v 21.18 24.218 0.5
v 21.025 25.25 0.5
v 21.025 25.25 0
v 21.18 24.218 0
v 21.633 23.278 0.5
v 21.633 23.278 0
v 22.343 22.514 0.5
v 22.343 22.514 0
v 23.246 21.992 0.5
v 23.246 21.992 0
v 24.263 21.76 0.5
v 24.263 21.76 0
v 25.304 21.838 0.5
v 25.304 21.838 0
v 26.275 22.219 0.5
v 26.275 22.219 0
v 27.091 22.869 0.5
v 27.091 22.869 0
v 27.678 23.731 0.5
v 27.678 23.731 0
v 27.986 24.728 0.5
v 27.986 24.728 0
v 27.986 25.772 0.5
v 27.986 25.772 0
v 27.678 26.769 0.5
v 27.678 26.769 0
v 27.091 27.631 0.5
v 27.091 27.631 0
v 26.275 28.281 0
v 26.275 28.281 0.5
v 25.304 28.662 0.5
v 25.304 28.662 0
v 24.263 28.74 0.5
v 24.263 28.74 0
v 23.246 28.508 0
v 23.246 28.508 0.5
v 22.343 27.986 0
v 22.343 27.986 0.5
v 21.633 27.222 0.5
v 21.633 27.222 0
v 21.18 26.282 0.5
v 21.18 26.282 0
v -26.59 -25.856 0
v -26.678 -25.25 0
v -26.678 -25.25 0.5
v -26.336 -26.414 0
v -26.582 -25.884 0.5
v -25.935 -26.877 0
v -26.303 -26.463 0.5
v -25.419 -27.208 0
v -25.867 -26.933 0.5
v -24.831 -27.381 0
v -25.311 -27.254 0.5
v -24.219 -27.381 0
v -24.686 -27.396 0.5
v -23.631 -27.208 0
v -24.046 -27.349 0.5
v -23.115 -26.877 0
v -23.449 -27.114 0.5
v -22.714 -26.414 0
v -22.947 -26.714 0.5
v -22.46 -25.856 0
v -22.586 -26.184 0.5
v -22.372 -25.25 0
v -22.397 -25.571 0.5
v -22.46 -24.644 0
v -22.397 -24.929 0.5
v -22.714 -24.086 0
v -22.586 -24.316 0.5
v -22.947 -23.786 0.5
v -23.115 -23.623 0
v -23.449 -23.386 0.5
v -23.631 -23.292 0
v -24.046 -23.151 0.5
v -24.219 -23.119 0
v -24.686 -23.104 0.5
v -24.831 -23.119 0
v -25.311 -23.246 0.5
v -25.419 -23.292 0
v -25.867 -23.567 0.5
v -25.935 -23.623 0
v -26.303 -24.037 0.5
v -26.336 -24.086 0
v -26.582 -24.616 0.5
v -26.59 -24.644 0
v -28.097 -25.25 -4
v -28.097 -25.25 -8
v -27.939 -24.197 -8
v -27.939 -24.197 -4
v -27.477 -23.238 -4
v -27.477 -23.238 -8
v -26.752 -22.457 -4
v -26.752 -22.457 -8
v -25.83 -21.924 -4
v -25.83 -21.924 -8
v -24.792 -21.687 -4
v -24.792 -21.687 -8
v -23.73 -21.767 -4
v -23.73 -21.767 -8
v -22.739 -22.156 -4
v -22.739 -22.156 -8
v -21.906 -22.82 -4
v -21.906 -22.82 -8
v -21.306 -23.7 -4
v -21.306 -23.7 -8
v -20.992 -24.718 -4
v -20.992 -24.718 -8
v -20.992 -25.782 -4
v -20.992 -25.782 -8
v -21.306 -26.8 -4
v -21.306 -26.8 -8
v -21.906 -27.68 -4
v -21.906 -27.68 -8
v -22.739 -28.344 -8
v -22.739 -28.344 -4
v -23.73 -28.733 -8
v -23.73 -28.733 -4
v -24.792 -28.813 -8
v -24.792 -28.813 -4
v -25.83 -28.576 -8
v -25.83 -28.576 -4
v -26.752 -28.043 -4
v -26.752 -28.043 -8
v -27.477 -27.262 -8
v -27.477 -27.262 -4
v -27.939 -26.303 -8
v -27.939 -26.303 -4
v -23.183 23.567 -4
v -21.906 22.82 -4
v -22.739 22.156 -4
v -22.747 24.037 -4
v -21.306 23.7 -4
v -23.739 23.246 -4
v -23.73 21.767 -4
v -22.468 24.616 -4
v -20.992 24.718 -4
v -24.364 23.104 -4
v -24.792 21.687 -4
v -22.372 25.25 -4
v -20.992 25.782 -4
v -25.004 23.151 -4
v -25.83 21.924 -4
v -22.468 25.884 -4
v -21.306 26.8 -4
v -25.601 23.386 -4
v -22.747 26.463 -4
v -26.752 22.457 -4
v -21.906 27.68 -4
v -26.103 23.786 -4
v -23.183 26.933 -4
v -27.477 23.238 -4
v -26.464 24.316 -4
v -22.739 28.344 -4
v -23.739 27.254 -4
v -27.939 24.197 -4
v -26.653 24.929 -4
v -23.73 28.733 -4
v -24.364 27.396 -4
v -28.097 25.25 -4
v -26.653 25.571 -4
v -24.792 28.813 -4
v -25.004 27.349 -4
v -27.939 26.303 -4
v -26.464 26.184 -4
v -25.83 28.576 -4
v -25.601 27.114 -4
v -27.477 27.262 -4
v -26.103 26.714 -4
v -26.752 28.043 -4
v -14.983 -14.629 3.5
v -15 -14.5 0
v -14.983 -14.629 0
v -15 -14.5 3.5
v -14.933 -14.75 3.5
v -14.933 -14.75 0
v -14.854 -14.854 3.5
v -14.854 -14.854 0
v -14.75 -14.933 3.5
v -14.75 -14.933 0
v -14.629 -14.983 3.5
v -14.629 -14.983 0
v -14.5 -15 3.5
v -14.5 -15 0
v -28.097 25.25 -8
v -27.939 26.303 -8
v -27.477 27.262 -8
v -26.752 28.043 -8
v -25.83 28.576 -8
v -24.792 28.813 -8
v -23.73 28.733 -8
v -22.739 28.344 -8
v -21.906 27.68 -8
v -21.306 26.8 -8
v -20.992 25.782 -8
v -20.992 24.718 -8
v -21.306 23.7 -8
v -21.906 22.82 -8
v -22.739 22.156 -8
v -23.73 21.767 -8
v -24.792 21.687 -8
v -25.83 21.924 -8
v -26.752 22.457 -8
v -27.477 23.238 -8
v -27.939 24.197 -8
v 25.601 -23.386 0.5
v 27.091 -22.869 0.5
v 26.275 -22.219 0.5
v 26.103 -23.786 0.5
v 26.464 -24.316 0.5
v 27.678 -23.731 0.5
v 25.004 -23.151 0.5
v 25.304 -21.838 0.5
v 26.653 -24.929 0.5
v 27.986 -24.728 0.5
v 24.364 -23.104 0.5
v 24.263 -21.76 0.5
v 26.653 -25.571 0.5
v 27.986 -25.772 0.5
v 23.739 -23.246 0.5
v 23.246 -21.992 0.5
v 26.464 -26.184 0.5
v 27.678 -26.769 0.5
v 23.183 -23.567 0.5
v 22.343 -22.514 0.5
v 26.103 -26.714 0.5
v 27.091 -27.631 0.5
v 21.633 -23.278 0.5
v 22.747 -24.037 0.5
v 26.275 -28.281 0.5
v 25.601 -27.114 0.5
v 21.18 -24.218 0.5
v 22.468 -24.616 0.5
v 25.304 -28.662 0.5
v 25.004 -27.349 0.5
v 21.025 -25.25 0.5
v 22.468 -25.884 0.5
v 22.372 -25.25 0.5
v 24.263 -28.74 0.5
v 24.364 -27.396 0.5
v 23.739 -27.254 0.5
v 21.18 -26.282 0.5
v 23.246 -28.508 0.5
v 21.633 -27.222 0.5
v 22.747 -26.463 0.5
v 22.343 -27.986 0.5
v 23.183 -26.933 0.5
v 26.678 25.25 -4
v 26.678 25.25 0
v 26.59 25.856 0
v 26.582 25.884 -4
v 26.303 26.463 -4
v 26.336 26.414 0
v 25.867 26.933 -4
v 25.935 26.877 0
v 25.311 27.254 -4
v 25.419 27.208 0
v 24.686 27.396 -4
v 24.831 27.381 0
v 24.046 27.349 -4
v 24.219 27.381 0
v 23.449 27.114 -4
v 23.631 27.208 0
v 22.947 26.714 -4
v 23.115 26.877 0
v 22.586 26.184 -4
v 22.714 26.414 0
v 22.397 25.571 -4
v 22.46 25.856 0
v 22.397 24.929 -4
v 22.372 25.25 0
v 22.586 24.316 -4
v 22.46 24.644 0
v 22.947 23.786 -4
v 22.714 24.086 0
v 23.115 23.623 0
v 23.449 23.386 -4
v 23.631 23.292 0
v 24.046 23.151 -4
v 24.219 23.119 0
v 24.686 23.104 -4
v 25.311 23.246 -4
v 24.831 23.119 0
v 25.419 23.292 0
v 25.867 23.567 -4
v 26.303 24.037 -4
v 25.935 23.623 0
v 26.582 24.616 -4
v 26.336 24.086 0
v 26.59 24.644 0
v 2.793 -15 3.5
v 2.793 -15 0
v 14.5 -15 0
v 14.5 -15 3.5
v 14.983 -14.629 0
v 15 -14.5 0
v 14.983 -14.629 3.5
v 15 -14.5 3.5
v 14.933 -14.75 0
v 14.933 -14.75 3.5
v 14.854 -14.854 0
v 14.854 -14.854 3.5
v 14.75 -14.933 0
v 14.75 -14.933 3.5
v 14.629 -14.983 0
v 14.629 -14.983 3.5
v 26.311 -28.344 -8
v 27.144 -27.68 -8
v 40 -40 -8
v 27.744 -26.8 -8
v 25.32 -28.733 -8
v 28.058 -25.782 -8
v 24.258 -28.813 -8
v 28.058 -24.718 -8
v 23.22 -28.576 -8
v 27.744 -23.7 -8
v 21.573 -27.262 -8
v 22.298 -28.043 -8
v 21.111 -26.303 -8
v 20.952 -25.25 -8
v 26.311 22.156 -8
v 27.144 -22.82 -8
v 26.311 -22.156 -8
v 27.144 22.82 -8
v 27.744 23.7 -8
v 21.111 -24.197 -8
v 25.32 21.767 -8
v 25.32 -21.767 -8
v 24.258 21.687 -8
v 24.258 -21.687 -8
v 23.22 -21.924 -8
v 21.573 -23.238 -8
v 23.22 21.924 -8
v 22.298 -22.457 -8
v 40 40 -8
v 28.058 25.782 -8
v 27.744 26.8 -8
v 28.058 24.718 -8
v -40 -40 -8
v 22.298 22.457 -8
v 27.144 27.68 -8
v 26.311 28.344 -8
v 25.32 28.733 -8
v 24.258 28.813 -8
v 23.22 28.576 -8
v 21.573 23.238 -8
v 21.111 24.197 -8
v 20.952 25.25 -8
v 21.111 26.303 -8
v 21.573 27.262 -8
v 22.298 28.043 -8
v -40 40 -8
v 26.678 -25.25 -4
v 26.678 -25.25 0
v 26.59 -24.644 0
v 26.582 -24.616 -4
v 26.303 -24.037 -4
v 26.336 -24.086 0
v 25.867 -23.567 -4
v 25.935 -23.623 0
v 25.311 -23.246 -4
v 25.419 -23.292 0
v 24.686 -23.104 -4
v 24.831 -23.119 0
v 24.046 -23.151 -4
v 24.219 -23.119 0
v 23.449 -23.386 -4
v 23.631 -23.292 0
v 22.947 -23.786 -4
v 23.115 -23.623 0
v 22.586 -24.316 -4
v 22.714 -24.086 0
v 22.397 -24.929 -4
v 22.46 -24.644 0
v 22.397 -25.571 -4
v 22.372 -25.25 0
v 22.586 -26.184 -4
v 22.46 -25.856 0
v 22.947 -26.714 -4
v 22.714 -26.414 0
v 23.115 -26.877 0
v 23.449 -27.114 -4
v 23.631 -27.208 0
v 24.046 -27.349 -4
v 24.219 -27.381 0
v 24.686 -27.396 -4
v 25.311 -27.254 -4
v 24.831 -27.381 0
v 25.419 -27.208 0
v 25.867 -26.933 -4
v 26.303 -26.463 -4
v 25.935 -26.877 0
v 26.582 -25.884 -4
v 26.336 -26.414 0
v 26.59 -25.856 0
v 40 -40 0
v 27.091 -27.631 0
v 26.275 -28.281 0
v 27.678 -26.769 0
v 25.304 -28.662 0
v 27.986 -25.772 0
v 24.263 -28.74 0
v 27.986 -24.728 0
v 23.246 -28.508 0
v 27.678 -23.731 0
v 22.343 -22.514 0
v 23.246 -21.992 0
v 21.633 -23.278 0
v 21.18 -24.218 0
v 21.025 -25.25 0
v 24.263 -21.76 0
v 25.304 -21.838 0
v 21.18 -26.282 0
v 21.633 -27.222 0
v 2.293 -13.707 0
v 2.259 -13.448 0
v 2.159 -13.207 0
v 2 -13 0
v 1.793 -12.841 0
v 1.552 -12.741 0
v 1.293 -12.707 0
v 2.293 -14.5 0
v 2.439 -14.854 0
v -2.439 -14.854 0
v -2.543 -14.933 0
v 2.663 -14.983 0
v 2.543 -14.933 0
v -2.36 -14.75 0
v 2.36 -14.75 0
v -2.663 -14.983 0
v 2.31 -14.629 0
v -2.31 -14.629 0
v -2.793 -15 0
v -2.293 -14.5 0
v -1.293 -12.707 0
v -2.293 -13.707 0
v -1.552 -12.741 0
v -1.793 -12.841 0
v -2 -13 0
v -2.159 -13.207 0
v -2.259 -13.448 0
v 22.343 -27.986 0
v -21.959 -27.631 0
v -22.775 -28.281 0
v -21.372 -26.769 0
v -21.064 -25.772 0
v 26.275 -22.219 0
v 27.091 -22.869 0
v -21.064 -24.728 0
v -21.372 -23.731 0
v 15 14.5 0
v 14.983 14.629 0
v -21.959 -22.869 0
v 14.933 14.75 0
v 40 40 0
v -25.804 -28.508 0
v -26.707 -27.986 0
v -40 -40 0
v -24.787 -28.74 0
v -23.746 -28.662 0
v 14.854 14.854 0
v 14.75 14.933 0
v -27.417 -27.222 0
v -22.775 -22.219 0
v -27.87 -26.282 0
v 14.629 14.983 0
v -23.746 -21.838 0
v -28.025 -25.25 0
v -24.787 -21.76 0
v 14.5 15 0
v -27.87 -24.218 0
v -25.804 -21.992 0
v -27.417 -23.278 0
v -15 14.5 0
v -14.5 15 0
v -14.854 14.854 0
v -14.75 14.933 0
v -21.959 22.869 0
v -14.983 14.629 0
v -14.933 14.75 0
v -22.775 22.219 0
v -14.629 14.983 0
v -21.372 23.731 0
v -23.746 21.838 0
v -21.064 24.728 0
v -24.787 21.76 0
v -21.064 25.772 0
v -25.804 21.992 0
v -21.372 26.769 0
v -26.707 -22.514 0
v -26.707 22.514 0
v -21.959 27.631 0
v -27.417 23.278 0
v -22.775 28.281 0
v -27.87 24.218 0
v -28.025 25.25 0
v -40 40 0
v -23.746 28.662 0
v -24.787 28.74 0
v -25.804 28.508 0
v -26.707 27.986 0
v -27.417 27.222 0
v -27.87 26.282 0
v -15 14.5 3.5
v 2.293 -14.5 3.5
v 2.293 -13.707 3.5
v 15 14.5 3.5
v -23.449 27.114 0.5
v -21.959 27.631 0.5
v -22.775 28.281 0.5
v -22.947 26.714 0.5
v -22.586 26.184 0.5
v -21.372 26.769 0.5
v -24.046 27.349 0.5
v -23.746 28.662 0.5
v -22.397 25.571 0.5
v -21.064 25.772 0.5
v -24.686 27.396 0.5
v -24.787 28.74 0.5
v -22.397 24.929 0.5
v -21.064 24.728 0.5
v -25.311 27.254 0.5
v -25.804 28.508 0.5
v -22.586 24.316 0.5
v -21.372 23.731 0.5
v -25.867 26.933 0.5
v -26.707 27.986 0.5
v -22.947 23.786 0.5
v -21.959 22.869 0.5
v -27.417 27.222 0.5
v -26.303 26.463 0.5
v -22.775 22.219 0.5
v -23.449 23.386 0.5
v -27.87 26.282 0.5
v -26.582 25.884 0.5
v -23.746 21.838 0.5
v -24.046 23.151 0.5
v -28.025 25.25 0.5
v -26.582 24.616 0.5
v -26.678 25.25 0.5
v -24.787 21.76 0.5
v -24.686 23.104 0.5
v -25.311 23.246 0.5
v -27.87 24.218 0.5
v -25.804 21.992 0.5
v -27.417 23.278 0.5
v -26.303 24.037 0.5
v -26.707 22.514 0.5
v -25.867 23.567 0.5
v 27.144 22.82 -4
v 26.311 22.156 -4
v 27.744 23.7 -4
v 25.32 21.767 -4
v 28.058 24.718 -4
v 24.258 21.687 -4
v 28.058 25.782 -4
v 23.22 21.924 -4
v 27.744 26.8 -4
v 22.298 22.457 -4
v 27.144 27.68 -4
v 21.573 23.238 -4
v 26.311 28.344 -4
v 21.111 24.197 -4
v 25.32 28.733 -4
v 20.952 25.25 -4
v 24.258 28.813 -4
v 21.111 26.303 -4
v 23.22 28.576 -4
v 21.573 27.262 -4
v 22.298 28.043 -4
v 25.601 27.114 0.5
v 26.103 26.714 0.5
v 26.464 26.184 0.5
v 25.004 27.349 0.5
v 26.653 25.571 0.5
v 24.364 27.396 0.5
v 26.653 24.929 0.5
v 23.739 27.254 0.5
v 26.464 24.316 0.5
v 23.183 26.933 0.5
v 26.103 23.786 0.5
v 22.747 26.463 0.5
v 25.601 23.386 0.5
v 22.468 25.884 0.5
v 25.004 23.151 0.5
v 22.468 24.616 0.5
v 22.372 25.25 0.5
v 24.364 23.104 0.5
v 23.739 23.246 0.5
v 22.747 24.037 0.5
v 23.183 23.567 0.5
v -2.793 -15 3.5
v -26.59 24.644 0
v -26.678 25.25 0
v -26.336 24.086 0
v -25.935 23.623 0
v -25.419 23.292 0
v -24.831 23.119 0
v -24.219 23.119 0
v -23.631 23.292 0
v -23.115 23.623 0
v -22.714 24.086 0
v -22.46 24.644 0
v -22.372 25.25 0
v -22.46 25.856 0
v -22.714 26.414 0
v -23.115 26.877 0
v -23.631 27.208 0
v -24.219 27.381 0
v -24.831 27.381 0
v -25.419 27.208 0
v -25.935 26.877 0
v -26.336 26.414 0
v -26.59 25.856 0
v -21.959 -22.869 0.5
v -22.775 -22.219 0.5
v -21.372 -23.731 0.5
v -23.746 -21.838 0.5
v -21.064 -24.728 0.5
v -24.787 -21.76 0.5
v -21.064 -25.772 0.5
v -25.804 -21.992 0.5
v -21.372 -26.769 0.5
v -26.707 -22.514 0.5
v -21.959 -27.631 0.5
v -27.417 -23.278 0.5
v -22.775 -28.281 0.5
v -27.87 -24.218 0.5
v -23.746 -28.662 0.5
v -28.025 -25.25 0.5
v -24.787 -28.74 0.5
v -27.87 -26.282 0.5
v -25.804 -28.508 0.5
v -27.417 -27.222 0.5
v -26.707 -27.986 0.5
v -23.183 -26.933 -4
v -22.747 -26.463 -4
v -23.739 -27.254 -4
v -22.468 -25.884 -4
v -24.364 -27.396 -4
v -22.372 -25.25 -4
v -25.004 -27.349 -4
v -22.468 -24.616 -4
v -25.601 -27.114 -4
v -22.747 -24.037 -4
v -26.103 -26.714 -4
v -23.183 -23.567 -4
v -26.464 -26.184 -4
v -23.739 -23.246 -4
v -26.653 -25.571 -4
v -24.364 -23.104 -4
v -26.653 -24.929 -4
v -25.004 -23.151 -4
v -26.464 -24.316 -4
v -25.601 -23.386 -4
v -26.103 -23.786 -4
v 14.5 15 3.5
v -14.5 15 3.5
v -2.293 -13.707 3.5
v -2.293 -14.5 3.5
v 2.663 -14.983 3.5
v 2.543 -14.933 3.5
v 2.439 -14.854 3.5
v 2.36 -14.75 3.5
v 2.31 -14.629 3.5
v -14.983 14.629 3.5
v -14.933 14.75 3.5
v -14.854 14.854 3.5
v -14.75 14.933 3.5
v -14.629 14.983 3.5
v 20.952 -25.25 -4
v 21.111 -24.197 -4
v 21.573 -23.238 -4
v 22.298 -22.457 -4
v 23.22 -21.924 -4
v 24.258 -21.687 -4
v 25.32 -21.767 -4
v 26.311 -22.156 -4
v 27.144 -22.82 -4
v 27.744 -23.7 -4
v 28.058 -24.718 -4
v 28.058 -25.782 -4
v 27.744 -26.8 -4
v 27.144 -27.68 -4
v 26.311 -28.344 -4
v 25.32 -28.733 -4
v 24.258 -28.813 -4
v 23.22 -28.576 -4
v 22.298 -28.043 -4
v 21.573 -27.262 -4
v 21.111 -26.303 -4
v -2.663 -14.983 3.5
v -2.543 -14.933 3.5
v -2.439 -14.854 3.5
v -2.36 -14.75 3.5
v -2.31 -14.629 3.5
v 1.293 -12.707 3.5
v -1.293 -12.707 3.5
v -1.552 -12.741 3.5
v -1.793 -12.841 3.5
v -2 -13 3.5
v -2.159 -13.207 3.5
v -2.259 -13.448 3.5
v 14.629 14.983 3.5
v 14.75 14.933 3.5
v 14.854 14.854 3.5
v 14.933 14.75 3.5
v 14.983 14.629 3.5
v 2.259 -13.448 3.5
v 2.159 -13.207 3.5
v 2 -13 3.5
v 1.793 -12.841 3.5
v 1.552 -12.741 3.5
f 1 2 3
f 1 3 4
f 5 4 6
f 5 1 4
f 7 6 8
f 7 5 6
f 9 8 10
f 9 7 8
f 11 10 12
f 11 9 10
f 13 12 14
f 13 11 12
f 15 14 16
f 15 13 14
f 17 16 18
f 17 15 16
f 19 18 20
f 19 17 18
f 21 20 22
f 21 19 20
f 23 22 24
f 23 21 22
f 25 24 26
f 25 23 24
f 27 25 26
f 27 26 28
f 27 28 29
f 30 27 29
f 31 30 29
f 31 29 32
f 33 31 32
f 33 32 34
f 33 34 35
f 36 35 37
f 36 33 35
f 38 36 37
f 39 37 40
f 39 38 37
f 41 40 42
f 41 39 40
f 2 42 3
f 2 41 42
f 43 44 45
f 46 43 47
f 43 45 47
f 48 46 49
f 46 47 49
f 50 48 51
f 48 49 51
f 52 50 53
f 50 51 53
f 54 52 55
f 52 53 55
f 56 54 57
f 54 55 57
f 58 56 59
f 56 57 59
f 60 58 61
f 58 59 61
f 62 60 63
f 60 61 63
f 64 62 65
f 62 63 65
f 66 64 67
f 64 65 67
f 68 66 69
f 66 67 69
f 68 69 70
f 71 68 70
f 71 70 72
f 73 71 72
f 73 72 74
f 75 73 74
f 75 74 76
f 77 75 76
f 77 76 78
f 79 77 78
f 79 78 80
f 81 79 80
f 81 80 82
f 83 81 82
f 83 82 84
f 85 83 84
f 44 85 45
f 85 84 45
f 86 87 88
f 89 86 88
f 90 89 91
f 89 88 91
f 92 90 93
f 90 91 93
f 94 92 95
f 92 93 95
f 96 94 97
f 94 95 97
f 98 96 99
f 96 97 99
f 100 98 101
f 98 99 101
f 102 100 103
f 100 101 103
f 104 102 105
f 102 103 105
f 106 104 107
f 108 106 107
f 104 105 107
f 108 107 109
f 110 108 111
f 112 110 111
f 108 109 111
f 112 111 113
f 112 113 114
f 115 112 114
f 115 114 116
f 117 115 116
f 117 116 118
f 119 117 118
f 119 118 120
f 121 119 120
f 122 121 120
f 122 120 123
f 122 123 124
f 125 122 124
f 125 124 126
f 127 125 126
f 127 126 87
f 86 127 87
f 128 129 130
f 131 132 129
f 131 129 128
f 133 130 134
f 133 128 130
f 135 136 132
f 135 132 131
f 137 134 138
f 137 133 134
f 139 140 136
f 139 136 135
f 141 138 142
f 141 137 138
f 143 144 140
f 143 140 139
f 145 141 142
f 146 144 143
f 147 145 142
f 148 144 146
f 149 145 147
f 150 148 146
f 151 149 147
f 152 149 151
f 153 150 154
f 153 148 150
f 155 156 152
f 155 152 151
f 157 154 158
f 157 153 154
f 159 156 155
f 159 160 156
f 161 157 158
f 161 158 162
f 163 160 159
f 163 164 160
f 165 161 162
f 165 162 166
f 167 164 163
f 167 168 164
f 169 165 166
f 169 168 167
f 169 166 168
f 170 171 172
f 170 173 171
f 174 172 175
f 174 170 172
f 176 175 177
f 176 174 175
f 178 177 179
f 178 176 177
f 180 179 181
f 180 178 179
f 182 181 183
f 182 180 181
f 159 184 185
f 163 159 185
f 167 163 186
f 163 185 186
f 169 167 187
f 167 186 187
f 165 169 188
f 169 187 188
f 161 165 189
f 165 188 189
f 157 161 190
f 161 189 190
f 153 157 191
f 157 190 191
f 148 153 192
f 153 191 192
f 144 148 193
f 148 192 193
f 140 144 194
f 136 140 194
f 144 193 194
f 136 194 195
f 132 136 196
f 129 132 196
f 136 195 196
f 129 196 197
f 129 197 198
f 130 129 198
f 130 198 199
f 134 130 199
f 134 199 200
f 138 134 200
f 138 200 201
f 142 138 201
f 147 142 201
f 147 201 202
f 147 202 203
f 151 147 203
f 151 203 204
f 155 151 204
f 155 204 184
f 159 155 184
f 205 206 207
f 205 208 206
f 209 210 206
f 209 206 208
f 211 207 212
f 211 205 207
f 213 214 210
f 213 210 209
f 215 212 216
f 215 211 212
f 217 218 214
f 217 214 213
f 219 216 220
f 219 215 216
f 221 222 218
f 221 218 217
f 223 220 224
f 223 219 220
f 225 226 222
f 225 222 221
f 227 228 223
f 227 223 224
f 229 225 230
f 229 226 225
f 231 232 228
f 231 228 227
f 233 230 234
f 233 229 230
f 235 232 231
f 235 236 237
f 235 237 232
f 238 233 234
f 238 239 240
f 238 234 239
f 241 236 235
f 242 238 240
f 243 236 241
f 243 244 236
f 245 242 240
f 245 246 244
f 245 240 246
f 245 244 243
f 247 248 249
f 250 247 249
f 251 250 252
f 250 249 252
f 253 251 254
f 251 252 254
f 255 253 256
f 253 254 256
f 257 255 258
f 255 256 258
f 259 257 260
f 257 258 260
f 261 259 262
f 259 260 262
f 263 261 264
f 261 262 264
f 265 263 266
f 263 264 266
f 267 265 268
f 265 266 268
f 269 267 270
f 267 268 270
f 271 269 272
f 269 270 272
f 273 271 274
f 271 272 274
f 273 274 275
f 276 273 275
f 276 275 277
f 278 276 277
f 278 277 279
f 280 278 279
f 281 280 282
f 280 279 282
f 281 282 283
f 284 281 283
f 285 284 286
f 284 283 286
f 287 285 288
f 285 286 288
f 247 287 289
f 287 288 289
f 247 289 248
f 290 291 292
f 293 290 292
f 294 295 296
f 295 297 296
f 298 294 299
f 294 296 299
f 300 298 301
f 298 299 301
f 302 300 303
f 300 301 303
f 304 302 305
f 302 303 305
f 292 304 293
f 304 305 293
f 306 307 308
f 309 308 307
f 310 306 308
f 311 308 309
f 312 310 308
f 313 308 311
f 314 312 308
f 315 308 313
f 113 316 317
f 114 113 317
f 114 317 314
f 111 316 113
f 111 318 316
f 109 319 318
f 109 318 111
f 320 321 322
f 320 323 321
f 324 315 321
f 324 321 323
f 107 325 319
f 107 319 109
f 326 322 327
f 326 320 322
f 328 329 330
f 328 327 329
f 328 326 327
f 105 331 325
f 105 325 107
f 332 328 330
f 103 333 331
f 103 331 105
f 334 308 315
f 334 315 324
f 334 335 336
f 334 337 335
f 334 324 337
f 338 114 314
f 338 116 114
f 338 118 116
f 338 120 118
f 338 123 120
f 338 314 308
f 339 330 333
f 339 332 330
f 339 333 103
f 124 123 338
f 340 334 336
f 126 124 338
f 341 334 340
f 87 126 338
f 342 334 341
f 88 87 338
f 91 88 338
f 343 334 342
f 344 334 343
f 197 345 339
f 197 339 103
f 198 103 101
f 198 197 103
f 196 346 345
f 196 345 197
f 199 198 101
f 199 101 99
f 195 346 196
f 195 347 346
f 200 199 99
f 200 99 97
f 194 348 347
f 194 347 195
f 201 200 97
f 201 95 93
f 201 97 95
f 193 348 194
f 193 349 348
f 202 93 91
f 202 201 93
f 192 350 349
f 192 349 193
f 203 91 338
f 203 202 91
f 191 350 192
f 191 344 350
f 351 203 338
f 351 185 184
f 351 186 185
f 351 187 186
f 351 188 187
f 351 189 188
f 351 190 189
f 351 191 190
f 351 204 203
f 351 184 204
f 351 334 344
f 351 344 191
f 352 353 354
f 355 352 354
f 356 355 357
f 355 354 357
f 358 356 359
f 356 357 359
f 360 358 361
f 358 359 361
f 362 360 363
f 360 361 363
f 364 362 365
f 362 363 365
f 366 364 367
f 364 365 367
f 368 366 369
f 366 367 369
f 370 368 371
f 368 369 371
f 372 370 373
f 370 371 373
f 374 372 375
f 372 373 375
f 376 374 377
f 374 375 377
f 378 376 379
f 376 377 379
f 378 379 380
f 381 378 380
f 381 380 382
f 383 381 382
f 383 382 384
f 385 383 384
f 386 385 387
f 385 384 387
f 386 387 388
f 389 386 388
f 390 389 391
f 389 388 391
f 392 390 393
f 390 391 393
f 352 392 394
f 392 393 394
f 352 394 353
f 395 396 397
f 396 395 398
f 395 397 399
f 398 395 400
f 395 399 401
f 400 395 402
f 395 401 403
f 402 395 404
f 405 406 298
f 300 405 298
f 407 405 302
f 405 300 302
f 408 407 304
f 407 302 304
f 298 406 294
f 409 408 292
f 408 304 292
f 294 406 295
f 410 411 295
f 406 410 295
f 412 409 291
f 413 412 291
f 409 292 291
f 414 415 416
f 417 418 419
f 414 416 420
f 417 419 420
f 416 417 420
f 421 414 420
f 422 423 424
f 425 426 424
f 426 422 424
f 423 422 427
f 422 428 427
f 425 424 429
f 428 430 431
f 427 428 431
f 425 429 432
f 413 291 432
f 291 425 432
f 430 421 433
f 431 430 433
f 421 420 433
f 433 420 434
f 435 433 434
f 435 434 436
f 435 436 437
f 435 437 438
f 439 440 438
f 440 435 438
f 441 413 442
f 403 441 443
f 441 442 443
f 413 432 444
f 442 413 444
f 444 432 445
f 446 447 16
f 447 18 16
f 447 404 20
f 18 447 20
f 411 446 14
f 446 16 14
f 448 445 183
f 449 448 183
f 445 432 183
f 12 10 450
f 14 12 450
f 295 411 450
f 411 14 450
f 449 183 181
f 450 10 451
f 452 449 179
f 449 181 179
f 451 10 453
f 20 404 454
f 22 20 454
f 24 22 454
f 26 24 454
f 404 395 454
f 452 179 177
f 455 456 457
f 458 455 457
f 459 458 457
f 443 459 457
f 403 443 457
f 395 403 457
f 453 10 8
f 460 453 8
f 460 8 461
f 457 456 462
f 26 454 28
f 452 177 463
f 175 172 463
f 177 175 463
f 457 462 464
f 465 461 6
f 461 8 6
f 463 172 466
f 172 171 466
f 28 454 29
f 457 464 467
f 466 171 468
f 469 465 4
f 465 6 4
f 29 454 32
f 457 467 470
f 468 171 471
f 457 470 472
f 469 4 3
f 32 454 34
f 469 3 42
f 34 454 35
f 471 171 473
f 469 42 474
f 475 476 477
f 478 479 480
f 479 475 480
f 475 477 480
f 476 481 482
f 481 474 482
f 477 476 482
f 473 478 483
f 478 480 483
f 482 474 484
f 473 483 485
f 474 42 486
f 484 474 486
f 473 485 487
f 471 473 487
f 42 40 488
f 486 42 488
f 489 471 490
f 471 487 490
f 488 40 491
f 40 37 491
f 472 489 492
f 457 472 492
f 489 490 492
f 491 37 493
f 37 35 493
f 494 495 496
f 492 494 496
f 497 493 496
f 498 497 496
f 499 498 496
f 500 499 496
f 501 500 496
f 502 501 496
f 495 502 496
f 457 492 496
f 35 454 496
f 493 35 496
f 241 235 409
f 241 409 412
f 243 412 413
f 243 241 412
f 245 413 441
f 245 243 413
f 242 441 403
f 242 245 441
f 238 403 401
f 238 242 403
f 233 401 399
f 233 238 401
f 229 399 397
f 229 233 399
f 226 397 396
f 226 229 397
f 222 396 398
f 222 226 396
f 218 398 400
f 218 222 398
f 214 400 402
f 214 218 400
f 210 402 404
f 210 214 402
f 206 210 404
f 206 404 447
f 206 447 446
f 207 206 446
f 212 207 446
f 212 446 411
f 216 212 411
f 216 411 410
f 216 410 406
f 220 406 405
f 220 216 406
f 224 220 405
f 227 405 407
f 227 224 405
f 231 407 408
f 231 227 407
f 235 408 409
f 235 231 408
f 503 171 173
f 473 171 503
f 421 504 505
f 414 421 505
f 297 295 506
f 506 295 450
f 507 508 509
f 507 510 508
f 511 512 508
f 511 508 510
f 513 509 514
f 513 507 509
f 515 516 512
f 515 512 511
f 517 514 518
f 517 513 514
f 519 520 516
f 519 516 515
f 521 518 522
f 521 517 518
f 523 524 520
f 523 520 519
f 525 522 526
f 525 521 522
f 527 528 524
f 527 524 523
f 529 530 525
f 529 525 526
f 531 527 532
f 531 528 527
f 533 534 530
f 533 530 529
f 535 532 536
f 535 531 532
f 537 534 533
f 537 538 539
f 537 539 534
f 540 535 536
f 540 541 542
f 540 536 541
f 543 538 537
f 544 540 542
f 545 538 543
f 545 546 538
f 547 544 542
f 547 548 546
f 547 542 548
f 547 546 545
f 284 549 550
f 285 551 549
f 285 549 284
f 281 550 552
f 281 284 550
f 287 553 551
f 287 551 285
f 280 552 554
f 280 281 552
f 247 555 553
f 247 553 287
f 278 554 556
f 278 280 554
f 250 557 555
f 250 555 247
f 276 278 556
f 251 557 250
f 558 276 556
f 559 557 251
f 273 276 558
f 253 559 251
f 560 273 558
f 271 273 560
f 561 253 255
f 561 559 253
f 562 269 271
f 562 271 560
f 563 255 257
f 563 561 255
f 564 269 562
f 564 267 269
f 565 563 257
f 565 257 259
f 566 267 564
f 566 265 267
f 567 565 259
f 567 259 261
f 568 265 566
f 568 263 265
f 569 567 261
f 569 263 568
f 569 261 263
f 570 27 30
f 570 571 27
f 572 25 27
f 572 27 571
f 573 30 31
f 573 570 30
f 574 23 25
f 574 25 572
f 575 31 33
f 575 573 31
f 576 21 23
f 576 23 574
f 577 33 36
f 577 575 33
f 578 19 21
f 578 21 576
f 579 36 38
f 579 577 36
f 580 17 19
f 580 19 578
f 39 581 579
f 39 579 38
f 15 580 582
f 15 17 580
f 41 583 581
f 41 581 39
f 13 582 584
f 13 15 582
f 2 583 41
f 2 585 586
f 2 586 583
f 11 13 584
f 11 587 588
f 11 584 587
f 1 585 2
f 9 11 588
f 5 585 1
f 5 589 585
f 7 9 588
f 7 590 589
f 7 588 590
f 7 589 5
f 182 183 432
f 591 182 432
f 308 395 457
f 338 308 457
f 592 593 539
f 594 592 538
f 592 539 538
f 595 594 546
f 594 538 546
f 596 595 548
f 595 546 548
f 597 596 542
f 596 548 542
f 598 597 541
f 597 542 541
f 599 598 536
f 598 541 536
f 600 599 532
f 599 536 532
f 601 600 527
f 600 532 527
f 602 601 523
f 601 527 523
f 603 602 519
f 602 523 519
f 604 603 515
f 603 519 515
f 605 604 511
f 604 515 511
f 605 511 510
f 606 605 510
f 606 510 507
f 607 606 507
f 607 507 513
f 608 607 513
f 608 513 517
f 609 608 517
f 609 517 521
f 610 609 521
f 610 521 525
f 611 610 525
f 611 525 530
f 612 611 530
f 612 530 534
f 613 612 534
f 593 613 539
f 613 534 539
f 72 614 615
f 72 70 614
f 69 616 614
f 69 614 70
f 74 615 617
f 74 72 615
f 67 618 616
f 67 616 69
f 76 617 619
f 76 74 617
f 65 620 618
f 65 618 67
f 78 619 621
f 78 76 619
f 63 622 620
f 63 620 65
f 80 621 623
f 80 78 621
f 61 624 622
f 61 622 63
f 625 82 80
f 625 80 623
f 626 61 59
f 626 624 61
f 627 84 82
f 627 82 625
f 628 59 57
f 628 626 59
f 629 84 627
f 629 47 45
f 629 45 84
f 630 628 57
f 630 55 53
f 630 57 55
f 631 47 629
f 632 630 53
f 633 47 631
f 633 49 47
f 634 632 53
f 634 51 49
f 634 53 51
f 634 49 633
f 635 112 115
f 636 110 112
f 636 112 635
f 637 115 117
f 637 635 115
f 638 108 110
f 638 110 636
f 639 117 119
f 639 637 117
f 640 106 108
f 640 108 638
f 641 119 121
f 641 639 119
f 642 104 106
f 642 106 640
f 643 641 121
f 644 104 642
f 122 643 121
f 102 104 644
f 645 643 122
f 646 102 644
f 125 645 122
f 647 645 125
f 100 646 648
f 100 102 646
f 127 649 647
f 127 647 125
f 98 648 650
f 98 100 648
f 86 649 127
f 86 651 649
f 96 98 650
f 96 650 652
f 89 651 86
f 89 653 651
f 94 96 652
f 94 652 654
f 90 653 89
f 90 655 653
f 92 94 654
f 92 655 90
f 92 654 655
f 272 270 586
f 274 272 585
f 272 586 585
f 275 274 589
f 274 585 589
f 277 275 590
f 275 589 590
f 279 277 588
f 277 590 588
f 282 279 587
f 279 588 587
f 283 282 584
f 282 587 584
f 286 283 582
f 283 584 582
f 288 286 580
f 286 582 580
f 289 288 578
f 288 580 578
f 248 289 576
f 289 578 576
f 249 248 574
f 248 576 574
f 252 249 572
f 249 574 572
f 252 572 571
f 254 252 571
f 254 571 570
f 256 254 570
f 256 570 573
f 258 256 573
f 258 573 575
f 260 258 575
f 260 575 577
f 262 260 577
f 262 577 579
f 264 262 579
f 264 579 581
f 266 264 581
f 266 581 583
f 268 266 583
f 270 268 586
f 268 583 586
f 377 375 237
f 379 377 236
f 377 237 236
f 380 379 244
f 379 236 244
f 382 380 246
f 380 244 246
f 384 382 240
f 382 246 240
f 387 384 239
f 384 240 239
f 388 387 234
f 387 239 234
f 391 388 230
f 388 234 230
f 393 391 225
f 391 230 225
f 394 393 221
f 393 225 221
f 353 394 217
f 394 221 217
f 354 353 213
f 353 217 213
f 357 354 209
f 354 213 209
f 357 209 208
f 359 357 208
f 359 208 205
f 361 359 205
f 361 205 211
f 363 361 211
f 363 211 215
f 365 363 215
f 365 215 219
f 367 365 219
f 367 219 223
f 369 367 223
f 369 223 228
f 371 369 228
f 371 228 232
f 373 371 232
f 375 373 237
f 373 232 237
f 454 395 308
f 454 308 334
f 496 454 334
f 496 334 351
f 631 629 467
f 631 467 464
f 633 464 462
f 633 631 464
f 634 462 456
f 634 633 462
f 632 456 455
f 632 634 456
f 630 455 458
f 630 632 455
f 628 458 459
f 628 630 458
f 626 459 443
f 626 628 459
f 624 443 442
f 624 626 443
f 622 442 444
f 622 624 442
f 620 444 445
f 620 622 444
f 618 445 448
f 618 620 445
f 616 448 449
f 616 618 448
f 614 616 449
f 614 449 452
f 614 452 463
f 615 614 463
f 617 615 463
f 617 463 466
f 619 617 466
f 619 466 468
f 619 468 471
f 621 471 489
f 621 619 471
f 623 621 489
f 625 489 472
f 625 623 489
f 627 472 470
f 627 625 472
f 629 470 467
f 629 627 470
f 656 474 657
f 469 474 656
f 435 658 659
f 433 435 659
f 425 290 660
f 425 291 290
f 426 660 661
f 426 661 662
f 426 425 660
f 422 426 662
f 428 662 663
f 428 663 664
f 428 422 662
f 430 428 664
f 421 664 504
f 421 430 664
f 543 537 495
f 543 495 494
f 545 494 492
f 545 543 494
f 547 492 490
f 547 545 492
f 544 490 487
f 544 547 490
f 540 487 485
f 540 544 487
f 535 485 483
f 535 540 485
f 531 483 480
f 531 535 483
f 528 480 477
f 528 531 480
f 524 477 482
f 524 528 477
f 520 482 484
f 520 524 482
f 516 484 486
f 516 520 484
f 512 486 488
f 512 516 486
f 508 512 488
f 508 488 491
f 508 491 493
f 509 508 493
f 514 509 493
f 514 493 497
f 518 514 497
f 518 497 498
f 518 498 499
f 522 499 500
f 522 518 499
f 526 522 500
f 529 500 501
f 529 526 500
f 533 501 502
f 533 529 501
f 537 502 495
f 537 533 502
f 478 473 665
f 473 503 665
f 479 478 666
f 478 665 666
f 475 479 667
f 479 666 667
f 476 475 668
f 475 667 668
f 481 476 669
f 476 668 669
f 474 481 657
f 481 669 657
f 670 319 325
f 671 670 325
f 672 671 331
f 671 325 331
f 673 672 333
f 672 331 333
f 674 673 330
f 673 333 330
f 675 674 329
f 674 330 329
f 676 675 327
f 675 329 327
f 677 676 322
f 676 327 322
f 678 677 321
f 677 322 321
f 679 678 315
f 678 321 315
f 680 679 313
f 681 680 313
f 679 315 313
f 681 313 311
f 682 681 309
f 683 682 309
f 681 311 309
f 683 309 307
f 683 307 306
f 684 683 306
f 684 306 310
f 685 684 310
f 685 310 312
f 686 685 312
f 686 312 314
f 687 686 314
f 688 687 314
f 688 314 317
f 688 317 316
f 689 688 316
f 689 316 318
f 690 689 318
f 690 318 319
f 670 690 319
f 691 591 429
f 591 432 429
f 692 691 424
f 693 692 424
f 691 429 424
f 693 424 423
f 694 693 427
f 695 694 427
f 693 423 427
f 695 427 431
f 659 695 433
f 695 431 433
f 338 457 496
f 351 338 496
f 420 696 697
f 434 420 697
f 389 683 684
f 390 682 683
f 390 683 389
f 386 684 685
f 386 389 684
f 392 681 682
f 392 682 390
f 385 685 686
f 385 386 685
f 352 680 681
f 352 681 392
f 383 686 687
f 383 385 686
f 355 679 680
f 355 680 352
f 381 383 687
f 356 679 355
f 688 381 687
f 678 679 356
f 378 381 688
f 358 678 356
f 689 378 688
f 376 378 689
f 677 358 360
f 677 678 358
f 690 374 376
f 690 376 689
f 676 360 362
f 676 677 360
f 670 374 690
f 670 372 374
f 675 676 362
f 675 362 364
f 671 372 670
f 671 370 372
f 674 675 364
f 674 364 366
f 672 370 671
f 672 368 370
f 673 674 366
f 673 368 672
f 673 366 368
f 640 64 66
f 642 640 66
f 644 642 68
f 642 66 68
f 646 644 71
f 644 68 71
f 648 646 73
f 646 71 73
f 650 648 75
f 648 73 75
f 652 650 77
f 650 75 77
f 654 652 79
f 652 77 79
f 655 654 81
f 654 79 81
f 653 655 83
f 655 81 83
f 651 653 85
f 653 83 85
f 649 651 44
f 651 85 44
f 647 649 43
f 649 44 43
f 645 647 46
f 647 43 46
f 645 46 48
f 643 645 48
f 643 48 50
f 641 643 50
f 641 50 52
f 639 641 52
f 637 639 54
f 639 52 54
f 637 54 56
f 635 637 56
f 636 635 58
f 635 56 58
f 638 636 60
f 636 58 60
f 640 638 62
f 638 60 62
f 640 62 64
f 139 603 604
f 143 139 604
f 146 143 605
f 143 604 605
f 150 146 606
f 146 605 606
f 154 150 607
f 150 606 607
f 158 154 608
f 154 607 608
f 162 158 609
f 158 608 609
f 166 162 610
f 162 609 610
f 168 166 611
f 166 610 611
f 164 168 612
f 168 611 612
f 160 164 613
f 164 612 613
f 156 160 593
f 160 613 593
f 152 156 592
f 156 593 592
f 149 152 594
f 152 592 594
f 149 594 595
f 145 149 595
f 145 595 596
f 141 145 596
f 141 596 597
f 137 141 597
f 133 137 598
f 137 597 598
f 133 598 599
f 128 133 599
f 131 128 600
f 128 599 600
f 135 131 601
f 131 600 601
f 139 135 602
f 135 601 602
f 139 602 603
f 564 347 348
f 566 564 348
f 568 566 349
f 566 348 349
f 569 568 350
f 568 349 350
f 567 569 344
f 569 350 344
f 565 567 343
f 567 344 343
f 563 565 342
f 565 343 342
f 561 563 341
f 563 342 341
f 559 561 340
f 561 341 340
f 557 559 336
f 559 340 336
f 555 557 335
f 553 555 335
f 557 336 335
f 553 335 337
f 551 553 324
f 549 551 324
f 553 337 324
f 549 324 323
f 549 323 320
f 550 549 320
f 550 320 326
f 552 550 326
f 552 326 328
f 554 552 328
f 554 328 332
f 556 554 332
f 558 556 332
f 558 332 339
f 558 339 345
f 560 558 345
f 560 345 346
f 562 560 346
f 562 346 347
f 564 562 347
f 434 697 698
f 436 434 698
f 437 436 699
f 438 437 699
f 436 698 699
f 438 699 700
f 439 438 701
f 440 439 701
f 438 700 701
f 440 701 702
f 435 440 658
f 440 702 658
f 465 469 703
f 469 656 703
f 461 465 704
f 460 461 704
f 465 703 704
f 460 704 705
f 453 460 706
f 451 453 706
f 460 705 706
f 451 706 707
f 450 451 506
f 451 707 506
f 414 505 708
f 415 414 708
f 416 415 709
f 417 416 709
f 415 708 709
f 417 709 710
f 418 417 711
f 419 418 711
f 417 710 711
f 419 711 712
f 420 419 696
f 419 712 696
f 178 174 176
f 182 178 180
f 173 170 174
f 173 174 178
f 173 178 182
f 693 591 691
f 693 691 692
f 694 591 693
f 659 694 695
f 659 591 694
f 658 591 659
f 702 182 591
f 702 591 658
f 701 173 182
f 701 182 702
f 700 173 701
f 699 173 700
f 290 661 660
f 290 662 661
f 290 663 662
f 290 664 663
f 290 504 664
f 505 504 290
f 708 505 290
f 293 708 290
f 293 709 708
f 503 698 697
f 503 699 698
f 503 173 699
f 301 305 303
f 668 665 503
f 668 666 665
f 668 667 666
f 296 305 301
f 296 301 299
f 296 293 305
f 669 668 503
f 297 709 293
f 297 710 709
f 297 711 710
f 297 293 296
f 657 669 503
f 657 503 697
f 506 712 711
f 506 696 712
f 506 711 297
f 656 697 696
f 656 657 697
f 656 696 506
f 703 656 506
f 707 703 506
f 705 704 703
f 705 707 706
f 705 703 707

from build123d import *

# Parameters (mm, degrees)
SKETCH1_W         = 30
SKETCH1_H         = 30
EXTRUSION1_DEPTH  = 3.5
SKETCH2_W         = 80
SKETCH2_H         = 80
EXTRUSION2_DEPTH  = 8
EXTRUSION3_DEPTH  = 3.5
FILLET1_R         = 0.5
HOLE2_D           = 4.305
HOLE2_DEPTH       = 8
HOLE2_CBORE_D     = 7.145
HOLE2_CBORE_DEPTH = 4
HOLE2_TIP         = 1.293352482
EXTRUSION4_START  = 0.5
SKETCH6_R         = 3.5
SKETCH6_R_2       = 2.1525
EXTRUSION4_DEPTH  = 0.5


with BuildPart() as part:
    # Sketch1 → Extrusion1 (new body)
    with BuildSketch(Plane.XY):
        Rectangle(SKETCH1_W, SKETCH1_H)
    extrude(amount=EXTRUSION1_DEPTH)

    # Sketch2 → Extrusion2 (add)
    with BuildSketch(Plane(origin=(0, 0, 0), x_dir=(-1, 0, 0), z_dir=(0, 0, -1))):
        Rectangle(SKETCH2_W, SKETCH2_H)
    extrude(amount=EXTRUSION2_DEPTH)

    # Sketch3 → Extrusion3 (cut)
    with BuildSketch(Plane.XY.offset(3.5)):
        with BuildLine():
            Line((-2.292893219, -15), (2.292893219, -15))
            Line((2.292893219, -15), (2.292893219, -13.707106781))
            ThreePointArc((2.292893219, -13.707106781), (2, -13), (1.292893219, -12.707106781))
            Line((1.292893219, -12.707106781), (-1.292893219, -12.707106781))
            ThreePointArc((-1.292893219, -12.707106781), (-2, -13), (-2.292893219, -13.707106781))
            Line((-2.292893219, -13.707106781), (-2.292893219, -15))
        make_face()
    extrude(amount=-EXTRUSION3_DEPTH, mode=Mode.SUBTRACT)

    # Fillet1
    fillet1_edges = [part.edges().sort_by_distance(p)[0] for p in [
        (2.292893219, -15, 1.75),
        (-2.292893219, -15, 1.75),
        (-15, 15, 1.75),
        (15, 15, 1.75),
        (15, -15, 1.75),
        (-15, -15, 1.75),
    ]]
    fillet(fillet1_edges, radius=FILLET1_R)

    # Hole2
    with Locations(Plane(origin=(0, 0, -8), x_dir=(-1, 0, 0), z_dir=(0, 0, -1))):
        with Locations((24.525, -25.25), (24.525, 25.25), (-24.525, 25.25), (-24.525, -25.25)):
            CounterBoreHole(HOLE2_D / 2, HOLE2_CBORE_D / 2, HOLE2_CBORE_DEPTH, depth=HOLE2_DEPTH)
            with Locations((0, 0, -(HOLE2_DEPTH + HOLE2_TIP / 2))):  # 118° drill point
                Cone(0, HOLE2_D / 2, HOLE2_TIP, mode=Mode.SUBTRACT)

    # Sketch6 → Extrusion4 (add)
    # profile 1 of 4: a face of its own
    with BuildSketch(Plane.XY.offset(EXTRUSION4_START)):
        with Locations(Location((-24.525, 25.25, 0), (0, 0, 180))):
            Circle(SKETCH6_R)
        with Locations(Location((-24.525, 25.25, 0), (0, 0, 180))):
            Circle(SKETCH6_R_2, mode=Mode.SUBTRACT)
    # profile 2 of 4: a face of its own
    with BuildSketch(Plane.XY.offset(EXTRUSION4_START)):
        with Locations(Location((24.525, 25.25, 0), (0, 0, 180))):
            Circle(SKETCH6_R)
        with Locations(Location((24.525, 25.25, 0), (0, 0, 180))):
            Circle(SKETCH6_R_2, mode=Mode.SUBTRACT)
    # profile 3 of 4: a face of its own
    with BuildSketch(Plane.XY.offset(EXTRUSION4_START)):
        with Locations(Location((-24.525, -25.25, 0), (0, 0, 180))):
            Circle(SKETCH6_R)
        with Locations(Location((-24.525, -25.25, 0), (0, 0, 180))):
            Circle(SKETCH6_R_2, mode=Mode.SUBTRACT)
    # profile 4 of 4: a face of its own
    with BuildSketch(Plane.XY.offset(EXTRUSION4_START)):
        with Locations(Location((24.525, -25.25, 0), (0, 0, 180))):
            Circle(SKETCH6_R)
        with Locations(Location((24.525, -25.25, 0), (0, 0, 180))):
            Circle(SKETCH6_R_2, mode=Mode.SUBTRACT)
    extrude(amount=-EXTRUSION4_DEPTH)


solid = part.part
